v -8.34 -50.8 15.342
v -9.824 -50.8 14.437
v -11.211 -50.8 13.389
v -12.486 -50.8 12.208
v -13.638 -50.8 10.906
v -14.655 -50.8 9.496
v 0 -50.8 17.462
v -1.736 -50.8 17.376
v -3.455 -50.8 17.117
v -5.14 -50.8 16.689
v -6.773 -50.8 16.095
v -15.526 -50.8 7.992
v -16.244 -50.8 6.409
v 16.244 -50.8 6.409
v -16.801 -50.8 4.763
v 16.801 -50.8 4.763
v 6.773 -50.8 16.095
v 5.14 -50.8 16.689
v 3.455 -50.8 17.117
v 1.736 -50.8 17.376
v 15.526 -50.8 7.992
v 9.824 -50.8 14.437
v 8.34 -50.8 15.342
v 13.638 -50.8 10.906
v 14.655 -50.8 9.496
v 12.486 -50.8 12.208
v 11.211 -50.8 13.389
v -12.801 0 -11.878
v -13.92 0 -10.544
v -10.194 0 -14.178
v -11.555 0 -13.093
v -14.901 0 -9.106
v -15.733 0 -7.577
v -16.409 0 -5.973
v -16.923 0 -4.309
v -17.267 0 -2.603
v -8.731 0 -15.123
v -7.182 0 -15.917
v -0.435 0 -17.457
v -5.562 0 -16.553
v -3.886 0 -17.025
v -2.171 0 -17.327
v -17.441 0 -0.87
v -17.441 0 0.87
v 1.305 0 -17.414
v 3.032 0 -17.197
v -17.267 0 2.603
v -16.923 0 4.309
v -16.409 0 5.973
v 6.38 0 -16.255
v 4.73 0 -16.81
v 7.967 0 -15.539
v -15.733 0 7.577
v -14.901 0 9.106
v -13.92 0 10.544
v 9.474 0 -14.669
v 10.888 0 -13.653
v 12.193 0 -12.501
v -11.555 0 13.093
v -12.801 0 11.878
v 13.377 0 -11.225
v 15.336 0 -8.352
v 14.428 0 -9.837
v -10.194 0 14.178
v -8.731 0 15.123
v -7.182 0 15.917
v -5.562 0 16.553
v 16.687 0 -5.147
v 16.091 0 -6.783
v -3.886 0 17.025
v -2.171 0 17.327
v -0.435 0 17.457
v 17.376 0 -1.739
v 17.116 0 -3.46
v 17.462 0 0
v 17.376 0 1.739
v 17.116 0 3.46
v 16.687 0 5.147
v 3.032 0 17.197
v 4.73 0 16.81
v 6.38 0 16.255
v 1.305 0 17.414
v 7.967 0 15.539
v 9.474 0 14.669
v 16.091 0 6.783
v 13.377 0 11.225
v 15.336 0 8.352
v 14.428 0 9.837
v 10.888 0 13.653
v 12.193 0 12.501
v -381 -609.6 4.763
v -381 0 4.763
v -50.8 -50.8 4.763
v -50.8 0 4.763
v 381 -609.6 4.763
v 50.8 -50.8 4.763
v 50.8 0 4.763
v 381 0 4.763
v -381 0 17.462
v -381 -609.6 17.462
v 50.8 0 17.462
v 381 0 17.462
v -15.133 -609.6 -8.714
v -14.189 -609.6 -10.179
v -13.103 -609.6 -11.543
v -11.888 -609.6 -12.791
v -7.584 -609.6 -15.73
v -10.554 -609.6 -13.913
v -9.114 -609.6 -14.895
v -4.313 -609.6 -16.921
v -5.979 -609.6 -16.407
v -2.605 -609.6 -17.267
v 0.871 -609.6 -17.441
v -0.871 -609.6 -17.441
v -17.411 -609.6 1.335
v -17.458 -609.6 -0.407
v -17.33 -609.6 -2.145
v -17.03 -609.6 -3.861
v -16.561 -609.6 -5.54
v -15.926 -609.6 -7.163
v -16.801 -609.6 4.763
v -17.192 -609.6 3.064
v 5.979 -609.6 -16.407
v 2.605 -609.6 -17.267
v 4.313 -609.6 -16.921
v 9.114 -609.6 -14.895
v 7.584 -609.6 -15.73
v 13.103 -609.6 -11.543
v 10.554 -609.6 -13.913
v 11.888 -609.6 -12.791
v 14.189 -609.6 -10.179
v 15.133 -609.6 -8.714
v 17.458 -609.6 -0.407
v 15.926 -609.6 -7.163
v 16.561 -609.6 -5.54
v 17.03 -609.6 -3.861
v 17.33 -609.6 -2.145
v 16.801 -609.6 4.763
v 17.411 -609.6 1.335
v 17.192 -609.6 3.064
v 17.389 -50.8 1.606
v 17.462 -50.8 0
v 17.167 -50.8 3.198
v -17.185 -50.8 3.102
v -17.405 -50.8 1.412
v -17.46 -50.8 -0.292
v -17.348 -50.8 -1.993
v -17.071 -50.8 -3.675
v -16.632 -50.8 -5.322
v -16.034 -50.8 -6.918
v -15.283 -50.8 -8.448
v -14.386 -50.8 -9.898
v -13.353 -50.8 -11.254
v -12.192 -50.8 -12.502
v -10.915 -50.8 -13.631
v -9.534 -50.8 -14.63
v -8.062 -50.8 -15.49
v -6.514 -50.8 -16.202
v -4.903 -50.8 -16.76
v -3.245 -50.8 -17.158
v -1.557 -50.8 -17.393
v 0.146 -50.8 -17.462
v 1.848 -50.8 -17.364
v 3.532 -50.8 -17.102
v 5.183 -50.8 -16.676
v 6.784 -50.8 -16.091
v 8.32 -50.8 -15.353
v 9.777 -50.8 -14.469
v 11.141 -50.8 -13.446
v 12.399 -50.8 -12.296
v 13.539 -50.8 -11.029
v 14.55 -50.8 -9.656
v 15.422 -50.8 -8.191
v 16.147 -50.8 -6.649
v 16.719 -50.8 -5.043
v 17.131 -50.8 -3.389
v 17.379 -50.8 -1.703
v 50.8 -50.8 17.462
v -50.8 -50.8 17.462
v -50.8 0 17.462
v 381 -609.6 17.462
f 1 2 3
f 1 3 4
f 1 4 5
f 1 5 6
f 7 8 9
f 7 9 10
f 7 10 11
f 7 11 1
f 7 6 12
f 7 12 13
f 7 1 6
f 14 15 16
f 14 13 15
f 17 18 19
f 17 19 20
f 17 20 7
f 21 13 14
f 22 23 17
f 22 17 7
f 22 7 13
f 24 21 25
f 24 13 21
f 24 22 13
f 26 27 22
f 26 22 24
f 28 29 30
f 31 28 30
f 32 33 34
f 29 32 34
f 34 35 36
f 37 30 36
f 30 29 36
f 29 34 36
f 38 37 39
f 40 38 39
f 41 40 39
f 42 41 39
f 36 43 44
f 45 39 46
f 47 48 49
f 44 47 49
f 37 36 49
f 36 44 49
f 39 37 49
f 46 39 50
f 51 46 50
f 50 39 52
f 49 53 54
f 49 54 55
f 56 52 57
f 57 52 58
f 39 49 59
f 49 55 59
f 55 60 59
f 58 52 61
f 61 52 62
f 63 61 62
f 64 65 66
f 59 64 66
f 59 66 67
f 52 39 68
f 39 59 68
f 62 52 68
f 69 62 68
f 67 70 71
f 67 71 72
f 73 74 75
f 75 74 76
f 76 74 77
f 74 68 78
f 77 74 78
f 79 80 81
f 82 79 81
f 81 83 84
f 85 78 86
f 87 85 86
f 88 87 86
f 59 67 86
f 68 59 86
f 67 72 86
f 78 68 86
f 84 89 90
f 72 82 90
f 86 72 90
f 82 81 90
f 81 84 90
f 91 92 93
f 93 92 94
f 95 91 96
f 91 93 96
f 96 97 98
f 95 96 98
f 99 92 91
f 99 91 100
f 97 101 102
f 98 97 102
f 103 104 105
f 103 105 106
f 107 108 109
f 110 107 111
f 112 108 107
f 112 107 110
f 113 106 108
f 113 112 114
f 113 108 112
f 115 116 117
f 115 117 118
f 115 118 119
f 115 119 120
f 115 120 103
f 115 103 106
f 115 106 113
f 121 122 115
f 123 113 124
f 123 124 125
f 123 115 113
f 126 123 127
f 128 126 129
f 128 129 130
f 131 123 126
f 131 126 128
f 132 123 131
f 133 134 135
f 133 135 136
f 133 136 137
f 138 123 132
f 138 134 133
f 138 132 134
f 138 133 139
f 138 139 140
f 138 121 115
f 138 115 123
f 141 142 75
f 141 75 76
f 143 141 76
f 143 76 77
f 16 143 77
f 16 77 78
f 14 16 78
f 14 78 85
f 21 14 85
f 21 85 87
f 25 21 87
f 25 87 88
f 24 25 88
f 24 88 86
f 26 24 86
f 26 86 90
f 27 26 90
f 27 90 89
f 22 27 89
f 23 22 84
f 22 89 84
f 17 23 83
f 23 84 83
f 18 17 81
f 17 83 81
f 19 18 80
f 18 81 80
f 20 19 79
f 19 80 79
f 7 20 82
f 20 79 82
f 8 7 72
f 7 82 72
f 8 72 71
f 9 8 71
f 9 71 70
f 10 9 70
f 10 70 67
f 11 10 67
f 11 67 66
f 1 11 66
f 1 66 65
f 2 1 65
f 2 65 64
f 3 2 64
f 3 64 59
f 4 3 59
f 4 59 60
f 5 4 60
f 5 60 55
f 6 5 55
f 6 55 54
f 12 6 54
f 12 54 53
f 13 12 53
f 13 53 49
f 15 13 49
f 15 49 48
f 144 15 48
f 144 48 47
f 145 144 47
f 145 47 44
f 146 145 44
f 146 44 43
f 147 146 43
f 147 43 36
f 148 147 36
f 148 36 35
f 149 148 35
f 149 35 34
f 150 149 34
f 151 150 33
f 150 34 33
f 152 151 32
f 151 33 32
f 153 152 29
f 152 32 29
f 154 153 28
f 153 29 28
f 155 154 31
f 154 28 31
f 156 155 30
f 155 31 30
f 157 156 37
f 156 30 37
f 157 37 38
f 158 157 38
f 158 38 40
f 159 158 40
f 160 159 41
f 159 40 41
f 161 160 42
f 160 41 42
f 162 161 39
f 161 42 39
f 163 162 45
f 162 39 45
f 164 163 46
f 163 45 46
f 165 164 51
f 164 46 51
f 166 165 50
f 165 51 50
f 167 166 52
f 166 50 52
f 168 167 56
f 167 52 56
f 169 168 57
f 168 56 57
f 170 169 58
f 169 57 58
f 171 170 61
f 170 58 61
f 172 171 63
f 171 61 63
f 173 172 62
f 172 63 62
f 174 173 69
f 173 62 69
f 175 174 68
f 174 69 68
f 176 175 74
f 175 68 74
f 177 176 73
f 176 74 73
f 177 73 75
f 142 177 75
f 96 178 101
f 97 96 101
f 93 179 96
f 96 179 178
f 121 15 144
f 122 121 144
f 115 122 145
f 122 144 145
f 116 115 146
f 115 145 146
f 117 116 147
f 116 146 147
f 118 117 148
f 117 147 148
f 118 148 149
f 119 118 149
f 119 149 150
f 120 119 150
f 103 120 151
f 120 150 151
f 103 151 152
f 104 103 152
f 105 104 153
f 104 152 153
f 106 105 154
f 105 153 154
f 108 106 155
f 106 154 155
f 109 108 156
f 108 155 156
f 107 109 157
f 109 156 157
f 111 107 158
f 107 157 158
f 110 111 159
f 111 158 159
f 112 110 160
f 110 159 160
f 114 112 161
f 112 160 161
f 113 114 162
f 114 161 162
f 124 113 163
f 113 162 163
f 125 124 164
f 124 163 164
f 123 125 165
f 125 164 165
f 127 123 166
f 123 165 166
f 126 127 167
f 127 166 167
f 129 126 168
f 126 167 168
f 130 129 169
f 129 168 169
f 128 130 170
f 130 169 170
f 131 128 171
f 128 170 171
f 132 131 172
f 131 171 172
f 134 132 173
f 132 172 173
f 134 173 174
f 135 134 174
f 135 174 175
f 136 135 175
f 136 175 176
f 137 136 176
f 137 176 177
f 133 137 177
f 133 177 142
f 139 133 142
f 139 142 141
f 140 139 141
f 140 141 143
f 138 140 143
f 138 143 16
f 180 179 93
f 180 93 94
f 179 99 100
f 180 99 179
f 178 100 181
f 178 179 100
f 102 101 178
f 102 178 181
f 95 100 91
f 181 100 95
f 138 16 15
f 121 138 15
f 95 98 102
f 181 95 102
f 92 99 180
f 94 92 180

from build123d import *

# Parameters (mm, degrees)
F0_R     = 17.4625
F1_DEPTH = 50.8
F3_DEPTH = 558.8
F4_W     = 762
F4_H     = 12.7
F5_DEPTH = 609.6
F6_W     = 101.6
F6_H     = 50.8
F7_DEPTH = 25.4


with BuildPart() as f1:
    # F0 (on Front) → F1 (new body)
    with BuildSketch(Plane.XZ):
        Circle(F0_R)
    extrude(amount=F1_DEPTH)

    # F2 (on face) → F3 (join)
    with BuildSketch(Plane.XZ.offset(50.8)):
        with BuildLine():
            Line((16.8005208253, 4.7625), (-16.8005208253, 4.7625))
            ThreePointArc((-16.8005208253, 4.7625), (0, -17.4625), (16.8005208253, 4.7625))
        make_face()
    extrude(amount=F3_DEPTH)


with BuildPart() as f5:
    # F4 (on Front) → F5 (new body)
    with BuildSketch(Plane.XZ):
        with Locations((0, 11.1125)):
            Rectangle(F4_W, F4_H)
    extrude(amount=F5_DEPTH)

    # F6 (on face) → F7 (cut)
    with BuildSketch(Plane.XY.offset(17.4625)):
        with Locations((0, -25.4)):
            Rectangle(F6_W, F6_H)
    extrude(amount=-F7_DEPTH, mode=Mode.SUBTRACT)


solid = Compound([f1.part, f5.part])
